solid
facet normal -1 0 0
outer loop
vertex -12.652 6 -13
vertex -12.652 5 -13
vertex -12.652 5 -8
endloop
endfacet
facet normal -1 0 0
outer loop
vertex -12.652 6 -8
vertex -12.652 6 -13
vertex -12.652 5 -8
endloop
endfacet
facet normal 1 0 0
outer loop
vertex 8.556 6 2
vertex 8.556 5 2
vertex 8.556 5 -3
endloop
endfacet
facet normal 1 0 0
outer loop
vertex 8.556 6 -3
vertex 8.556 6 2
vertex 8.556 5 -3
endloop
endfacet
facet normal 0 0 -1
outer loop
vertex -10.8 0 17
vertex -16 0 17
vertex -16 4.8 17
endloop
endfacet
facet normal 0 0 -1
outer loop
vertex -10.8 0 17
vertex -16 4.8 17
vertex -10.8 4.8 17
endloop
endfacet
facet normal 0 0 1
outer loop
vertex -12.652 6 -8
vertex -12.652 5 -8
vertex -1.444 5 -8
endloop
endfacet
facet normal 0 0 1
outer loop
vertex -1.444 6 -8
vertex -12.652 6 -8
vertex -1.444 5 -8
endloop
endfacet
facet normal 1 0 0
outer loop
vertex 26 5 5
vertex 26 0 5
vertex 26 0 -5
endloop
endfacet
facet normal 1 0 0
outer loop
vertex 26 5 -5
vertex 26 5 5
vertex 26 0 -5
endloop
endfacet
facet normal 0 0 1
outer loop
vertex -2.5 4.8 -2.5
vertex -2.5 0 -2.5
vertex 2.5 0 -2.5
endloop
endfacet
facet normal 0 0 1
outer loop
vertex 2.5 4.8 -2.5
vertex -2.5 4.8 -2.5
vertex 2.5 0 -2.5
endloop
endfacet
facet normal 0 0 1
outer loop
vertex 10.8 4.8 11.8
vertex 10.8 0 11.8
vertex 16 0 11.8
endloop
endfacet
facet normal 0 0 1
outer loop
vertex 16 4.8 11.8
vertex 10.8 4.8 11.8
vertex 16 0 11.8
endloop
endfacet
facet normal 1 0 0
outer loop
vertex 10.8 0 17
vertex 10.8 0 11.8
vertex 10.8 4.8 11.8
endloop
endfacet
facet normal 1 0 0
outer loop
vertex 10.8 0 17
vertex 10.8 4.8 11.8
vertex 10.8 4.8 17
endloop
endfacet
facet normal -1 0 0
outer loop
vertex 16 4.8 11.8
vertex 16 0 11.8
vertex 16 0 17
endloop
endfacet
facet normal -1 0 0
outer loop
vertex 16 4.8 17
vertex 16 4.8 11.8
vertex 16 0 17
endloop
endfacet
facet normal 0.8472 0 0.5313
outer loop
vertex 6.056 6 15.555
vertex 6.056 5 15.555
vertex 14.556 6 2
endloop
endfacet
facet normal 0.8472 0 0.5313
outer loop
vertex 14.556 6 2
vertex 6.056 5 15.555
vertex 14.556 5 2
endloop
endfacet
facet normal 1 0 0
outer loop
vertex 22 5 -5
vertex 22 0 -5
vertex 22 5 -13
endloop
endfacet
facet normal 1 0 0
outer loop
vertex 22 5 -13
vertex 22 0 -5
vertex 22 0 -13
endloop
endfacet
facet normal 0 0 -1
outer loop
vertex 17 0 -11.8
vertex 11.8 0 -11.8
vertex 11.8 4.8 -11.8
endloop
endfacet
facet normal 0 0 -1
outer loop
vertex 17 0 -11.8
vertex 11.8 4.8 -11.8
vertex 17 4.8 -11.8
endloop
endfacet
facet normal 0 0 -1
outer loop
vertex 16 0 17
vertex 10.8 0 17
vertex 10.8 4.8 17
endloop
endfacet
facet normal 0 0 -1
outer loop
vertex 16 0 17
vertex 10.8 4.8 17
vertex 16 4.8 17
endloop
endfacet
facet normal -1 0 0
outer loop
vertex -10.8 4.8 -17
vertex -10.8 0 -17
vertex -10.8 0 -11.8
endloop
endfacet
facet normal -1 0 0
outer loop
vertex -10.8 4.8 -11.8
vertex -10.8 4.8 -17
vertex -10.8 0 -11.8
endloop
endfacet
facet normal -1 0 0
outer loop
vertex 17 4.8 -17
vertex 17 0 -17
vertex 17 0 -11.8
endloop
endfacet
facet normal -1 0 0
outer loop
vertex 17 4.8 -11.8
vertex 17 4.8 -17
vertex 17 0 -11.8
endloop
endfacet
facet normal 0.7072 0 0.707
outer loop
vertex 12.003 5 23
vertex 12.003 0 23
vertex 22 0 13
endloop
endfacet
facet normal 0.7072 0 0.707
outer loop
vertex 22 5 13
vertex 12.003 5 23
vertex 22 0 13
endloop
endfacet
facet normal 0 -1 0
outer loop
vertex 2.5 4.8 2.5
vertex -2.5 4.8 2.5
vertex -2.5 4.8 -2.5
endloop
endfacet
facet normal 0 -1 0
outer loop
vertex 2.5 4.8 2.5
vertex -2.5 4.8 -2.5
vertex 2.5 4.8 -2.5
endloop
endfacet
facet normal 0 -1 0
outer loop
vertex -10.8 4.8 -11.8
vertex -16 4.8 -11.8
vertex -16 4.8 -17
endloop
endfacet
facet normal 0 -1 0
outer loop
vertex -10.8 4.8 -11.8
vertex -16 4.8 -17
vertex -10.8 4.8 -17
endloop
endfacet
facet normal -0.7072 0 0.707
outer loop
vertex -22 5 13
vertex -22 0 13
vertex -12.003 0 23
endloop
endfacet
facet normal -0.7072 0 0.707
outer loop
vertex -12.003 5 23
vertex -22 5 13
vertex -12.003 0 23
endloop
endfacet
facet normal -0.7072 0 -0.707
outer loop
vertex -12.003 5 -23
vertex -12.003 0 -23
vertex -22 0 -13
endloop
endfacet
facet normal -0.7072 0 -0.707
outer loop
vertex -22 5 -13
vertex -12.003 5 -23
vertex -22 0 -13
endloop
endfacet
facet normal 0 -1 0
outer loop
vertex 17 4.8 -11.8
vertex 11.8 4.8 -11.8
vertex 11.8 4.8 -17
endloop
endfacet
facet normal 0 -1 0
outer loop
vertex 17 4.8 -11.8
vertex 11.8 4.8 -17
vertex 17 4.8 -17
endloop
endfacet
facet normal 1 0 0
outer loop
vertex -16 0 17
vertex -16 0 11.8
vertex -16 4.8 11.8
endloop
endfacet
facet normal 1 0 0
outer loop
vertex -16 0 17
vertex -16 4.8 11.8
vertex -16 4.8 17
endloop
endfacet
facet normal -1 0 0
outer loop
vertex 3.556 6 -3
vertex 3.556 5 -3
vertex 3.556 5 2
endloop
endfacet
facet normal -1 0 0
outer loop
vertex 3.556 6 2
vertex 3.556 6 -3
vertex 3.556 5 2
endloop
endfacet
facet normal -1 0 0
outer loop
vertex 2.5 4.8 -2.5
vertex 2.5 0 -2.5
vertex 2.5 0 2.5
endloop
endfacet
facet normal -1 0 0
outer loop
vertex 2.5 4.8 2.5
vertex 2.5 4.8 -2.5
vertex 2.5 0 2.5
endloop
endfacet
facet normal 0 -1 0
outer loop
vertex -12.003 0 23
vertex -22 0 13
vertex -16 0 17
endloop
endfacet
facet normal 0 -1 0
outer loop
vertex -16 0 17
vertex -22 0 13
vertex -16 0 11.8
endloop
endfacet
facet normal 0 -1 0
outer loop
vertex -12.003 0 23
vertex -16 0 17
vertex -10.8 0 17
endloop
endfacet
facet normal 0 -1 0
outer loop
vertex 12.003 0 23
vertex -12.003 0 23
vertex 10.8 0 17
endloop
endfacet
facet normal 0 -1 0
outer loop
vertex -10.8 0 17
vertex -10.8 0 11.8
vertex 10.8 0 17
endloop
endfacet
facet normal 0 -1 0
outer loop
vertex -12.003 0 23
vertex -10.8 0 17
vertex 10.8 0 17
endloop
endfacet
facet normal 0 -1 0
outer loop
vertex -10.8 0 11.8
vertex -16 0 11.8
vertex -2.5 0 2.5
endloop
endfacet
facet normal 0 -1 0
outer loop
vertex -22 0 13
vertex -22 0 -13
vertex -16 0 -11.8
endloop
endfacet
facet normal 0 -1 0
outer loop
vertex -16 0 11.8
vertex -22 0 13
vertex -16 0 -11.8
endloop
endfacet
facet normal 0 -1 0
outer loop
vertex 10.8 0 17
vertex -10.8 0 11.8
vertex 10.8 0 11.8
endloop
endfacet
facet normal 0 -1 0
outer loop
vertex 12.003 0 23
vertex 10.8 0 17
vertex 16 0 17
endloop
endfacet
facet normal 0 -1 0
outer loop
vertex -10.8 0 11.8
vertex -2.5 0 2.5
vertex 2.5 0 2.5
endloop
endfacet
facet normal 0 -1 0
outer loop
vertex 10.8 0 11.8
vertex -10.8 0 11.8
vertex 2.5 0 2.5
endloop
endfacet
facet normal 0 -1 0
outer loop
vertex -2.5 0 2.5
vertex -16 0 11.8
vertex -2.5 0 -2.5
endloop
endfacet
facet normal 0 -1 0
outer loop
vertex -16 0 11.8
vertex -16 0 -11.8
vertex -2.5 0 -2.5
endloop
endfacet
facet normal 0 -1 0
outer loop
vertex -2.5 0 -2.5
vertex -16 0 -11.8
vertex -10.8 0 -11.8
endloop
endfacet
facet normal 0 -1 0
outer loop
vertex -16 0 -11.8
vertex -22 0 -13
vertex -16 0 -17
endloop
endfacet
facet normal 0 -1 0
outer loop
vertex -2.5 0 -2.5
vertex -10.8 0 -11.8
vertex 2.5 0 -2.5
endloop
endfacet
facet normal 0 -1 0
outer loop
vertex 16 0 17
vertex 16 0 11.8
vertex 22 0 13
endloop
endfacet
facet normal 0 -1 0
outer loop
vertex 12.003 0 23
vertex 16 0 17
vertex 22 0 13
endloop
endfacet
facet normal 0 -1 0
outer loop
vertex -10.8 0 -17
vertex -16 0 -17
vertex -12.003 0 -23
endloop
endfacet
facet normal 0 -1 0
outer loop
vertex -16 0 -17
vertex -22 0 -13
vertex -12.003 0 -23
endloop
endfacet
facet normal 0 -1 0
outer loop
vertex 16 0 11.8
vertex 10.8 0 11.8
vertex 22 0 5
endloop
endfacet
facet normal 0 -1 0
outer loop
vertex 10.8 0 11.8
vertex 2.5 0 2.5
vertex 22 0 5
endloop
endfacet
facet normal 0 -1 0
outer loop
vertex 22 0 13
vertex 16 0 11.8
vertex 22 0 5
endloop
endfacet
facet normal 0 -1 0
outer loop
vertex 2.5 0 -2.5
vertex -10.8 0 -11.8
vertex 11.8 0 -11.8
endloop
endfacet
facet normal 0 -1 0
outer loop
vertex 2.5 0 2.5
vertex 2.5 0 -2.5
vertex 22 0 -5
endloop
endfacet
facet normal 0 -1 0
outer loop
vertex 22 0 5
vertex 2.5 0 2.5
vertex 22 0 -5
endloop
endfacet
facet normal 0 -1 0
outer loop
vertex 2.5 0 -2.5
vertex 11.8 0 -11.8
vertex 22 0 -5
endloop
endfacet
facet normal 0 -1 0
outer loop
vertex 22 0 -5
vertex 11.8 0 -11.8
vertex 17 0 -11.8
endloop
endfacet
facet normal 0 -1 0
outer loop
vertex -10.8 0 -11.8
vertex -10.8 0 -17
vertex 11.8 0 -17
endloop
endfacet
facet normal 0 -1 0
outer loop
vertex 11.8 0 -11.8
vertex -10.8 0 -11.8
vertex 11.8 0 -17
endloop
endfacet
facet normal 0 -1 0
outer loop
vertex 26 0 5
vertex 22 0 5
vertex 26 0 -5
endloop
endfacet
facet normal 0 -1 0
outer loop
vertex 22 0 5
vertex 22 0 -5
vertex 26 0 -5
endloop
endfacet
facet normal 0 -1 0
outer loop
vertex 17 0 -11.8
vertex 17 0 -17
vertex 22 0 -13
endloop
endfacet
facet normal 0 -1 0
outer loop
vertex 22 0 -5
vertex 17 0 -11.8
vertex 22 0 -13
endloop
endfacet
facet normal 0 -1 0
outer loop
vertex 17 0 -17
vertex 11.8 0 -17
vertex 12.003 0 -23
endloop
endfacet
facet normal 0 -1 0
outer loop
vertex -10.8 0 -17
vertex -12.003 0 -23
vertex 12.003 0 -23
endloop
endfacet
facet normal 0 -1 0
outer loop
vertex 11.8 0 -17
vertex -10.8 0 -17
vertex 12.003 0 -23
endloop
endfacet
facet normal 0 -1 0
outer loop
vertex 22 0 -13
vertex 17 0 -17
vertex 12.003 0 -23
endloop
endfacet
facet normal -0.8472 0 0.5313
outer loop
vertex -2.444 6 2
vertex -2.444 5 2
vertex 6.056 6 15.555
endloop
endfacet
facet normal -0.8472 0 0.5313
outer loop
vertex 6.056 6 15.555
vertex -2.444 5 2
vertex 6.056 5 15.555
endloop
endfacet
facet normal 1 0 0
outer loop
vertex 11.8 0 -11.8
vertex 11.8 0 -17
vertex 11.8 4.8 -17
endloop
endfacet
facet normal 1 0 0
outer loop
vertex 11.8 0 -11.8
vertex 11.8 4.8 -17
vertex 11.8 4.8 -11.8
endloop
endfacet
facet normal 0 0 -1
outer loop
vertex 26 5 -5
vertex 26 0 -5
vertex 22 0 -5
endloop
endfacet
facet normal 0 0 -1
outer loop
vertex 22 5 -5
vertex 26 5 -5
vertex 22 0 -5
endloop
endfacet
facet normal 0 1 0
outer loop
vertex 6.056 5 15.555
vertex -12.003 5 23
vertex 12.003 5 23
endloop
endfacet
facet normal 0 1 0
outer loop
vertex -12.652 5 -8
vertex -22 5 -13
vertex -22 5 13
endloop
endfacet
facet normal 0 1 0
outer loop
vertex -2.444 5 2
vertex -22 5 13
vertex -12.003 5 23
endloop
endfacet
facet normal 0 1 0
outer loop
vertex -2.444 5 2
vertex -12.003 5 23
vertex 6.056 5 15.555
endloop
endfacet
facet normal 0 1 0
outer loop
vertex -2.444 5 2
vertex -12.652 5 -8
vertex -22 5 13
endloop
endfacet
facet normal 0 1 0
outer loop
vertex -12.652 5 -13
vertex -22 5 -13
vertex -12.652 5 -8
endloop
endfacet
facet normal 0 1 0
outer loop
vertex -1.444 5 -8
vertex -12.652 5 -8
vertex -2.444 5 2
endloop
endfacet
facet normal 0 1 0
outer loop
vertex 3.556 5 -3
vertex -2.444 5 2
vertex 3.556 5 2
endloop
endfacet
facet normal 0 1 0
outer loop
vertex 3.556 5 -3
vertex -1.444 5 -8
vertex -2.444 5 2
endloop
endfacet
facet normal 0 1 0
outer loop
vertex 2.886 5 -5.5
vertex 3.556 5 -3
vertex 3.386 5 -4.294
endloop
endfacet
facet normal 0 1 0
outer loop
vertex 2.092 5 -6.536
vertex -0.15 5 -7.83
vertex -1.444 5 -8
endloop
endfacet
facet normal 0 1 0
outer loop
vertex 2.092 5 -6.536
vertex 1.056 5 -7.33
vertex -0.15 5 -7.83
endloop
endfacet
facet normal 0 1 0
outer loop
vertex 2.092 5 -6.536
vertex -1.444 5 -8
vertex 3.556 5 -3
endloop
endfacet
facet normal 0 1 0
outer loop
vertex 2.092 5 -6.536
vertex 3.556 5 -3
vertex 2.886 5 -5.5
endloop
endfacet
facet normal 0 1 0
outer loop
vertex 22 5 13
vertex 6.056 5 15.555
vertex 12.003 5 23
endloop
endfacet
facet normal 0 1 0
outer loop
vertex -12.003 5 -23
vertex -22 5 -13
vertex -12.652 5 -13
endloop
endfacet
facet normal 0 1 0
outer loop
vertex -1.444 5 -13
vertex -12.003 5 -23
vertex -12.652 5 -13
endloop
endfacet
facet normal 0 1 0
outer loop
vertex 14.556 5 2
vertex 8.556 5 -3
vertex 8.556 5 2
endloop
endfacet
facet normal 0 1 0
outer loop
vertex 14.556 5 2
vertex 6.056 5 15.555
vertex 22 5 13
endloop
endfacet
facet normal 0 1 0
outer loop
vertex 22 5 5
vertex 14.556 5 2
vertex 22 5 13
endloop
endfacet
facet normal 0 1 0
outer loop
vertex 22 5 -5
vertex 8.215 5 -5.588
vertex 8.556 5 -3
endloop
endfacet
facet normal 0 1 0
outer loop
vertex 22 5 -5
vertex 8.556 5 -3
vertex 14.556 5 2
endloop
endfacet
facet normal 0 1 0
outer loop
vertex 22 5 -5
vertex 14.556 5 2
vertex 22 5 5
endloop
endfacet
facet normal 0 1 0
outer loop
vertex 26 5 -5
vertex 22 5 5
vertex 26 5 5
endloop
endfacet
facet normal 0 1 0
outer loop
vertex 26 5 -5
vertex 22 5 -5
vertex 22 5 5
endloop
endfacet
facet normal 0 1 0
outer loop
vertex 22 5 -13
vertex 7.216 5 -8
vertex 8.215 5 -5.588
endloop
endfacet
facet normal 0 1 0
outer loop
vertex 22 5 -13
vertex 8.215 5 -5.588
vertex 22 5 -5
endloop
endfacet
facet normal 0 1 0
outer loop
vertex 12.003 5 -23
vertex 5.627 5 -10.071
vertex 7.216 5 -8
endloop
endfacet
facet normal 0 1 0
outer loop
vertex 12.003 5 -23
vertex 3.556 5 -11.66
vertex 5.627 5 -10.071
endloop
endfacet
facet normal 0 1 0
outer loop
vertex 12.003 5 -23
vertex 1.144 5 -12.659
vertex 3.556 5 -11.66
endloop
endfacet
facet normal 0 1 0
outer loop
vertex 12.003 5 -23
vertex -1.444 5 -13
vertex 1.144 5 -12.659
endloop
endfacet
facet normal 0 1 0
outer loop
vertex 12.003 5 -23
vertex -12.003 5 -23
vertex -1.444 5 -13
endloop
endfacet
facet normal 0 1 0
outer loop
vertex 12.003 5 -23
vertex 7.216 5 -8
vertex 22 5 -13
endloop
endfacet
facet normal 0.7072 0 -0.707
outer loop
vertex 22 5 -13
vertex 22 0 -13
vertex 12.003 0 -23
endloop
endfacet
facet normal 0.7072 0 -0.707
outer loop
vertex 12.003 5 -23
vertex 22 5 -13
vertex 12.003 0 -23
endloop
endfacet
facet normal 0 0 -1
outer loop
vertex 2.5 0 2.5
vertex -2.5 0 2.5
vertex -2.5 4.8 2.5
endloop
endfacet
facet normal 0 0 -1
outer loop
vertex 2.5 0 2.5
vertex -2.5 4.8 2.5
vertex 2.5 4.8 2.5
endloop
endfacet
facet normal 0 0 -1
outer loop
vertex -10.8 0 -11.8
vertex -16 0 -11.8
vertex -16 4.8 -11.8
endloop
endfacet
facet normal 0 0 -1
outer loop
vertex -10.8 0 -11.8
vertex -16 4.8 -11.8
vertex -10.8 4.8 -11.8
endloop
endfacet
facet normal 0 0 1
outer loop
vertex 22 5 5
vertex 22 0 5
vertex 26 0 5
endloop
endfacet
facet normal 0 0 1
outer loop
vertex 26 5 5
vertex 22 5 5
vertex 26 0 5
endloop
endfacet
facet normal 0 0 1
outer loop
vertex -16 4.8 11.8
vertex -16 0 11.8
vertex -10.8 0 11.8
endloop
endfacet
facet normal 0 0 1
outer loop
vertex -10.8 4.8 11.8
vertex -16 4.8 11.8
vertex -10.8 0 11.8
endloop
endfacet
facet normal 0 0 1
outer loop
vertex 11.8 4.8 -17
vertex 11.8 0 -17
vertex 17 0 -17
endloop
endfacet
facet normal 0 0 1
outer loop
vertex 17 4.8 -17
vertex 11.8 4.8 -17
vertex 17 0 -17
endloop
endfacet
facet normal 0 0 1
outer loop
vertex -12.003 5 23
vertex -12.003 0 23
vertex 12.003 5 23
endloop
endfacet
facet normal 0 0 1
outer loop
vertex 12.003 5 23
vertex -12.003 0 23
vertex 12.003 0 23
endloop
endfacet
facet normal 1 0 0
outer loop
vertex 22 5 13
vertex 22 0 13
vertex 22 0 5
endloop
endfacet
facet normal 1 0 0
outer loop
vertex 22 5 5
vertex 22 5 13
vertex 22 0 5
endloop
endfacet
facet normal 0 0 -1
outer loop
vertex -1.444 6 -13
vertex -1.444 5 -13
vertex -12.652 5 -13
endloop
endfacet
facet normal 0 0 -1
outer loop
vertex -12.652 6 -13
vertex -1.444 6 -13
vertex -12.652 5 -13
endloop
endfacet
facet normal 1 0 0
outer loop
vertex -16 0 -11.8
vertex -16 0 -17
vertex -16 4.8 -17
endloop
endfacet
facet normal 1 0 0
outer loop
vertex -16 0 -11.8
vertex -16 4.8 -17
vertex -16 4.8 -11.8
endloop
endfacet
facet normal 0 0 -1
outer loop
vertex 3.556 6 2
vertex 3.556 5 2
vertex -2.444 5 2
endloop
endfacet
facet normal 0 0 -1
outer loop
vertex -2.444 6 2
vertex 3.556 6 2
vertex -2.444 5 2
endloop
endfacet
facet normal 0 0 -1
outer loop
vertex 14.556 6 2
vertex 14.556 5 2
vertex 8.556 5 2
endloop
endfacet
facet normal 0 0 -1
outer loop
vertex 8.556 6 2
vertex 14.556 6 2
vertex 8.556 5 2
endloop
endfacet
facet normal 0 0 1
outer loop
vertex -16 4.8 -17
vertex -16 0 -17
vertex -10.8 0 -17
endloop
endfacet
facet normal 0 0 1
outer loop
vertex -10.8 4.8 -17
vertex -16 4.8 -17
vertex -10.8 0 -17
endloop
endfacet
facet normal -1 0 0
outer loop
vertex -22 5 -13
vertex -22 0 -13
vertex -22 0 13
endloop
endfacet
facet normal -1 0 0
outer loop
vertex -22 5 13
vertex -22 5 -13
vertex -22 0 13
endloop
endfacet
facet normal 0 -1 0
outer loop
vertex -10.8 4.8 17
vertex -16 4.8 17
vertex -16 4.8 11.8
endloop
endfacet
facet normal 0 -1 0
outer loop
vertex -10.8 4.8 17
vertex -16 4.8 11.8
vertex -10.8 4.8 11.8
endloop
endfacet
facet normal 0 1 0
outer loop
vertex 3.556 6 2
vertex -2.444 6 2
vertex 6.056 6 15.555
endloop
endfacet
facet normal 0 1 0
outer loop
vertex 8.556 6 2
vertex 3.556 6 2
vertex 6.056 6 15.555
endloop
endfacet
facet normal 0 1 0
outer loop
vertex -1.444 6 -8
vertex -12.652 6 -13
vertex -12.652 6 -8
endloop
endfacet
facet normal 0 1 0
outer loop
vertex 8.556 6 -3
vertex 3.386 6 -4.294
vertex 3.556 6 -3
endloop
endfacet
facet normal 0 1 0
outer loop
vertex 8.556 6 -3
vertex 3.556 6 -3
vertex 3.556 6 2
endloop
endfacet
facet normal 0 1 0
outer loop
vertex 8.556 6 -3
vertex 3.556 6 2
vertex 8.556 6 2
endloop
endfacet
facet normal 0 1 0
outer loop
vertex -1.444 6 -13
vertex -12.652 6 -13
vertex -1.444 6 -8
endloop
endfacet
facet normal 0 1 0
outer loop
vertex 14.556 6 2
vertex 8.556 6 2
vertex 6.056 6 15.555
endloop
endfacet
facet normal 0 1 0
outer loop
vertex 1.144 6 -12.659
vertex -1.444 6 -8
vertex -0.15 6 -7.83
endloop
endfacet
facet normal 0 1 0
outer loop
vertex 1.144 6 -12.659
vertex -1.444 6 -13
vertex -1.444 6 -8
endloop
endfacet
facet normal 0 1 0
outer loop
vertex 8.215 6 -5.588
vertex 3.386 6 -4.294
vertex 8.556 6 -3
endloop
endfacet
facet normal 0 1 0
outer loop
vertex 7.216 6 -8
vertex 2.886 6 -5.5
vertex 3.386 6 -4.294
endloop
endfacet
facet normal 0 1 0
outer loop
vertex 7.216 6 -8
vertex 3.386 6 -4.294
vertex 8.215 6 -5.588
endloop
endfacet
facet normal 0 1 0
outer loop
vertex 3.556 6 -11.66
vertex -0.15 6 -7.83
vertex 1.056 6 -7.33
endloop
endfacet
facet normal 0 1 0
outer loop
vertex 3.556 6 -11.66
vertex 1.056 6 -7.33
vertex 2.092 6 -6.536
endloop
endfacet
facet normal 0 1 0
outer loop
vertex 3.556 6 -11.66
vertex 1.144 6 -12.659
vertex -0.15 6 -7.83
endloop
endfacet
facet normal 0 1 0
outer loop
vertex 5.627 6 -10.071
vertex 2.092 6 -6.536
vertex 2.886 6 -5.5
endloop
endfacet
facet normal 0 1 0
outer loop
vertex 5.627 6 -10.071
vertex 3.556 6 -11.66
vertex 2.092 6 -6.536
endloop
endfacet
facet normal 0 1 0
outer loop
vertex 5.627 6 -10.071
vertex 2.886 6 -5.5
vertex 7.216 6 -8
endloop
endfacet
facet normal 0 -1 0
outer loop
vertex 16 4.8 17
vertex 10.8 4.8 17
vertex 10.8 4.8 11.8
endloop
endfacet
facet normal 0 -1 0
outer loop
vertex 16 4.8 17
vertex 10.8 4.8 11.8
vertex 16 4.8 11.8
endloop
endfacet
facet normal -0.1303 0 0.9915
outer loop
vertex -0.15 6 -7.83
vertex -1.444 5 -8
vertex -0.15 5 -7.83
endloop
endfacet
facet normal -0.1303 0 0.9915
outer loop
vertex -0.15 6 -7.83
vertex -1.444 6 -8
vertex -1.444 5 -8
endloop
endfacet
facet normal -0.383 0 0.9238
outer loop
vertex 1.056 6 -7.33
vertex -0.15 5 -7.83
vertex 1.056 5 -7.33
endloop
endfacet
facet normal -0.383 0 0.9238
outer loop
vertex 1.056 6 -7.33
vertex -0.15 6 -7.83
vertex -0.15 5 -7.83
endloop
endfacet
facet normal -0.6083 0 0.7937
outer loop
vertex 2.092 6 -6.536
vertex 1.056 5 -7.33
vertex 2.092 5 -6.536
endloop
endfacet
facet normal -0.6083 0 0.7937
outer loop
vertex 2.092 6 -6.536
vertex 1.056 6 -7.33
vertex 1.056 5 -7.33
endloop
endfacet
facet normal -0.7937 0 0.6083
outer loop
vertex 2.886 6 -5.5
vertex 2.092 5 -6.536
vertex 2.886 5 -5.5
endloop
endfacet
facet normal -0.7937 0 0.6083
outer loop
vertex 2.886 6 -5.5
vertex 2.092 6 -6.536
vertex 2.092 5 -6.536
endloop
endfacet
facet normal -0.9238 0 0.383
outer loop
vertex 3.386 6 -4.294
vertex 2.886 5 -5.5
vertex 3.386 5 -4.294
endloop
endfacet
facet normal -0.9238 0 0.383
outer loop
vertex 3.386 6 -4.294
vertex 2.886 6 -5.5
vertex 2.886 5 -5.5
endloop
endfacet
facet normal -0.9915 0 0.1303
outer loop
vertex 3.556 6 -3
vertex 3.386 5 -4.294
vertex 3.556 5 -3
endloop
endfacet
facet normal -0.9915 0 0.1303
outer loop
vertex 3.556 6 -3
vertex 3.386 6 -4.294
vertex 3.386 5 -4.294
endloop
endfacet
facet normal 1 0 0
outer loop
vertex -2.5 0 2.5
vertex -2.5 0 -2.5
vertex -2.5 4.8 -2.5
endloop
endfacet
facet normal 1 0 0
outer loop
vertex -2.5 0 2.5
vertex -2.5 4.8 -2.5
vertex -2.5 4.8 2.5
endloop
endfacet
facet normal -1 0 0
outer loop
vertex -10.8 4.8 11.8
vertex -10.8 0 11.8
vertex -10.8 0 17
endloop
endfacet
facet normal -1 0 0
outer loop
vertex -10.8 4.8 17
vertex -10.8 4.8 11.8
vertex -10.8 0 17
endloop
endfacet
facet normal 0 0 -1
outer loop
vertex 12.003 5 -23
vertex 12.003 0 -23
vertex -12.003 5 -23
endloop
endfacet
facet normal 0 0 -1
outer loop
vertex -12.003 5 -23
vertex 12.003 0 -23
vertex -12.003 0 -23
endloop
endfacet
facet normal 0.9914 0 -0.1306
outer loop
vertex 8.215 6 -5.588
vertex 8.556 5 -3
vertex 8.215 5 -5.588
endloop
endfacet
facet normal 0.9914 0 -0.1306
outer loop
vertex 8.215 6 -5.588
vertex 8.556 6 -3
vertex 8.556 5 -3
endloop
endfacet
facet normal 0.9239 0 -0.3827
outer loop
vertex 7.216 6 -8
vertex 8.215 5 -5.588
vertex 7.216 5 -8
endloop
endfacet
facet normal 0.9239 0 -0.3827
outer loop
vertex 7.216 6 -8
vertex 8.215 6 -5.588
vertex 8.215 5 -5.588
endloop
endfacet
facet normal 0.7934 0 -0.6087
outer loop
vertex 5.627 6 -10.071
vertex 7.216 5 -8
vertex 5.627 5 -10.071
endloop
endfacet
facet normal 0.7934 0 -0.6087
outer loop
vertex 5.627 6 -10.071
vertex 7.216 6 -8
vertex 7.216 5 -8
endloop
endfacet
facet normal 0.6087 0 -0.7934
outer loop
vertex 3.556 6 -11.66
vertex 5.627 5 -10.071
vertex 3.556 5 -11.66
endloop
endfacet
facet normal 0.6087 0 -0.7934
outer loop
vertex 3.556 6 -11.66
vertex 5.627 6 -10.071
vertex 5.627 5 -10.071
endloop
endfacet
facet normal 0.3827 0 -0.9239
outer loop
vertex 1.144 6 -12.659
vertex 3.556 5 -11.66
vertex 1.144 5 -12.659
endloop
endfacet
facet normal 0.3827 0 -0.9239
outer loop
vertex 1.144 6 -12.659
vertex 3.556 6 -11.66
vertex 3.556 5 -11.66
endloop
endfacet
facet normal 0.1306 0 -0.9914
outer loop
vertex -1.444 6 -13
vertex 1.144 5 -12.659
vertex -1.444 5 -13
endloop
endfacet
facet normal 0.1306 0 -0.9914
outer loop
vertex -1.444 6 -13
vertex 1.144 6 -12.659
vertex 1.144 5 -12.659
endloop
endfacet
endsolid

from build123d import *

# Parameters (mm, degrees)
BOSS_EXTRU_1_DEPTH      = 5
BOSS_EXTRU_2_DEPTH      = 1
ESQUISSE3_W             = 5.2
ESQUISSE3_H             = 5.2
ESQUISSE3_W_2           = 5
ESQUISSE3_H_2           = 5
ENL_V_MAT_EXTRU_1_DEPTH = 4.8
CONG_1_R                = 10
CONG_2_R                = 5


with BuildPart() as part:
    # Esquisse1 → Boss.-Extru.1 (new body)
    with BuildSketch(Plane(origin=(0, 0, 0), x_dir=(1, 0, 0), z_dir=(0, 1, 0))):
        Polygon((22, 13), (12.003020456, 23), (-12.003020456, 23), (-22, 13), (-22, -13), (-12.003020456, -23), (12.003020456, -23), (22, -13), (22, -5), (26, -5), (26, 5), (22, 5), align=None)
    extrude(amount=BOSS_EXTRU_1_DEPTH)

    # Esquisse2 → Boss.-Extru.2 (add)
    with BuildSketch(Plane(origin=(0, 5, 0), x_dir=(1, 0, 0), z_dir=(0, 1, 0))):
        Polygon((-12.651968736, 13), (-12.651968736, 8), (3.556100985, 8), (3.556100985, -2), (-2.443899015, -2), (6.056100985, -15.555441712), (14.556100985, -2), (8.556100985, -2), (8.556100985, 13), align=None)
    extrude(amount=BOSS_EXTRU_2_DEPTH)

    # Esquisse3 → Enlèv. mat.-Extru.1 (cut)
    with BuildSketch(Plane.XZ):
        with Locations((-13.4, 14.4)):
            Rectangle(ESQUISSE3_W, ESQUISSE3_H)
        with Locations((-13.4, -14.4)):
            Rectangle(ESQUISSE3_W, ESQUISSE3_H)
        with Locations((14.4, -14.4)):
            Rectangle(ESQUISSE3_W, ESQUISSE3_H)
        with Locations((13.4, 14.4)):
            Rectangle(ESQUISSE3_W, ESQUISSE3_H)
        Rectangle(ESQUISSE3_W_2, ESQUISSE3_H_2)
    extrude(amount=-ENL_V_MAT_EXTRU_1_DEPTH, mode=Mode.SUBTRACT)

    # Congé1
    cong_1_edges = [part.edges().sort_by_distance(p)[0] for p in [
        (8.556100985, 5.5, -13),
    ]]
    fillet(cong_1_edges, radius=CONG_1_R)

    # Congé2
    cong_2_edges = [part.edges().sort_by_distance(p)[0] for p in [
        (3.556100985, 5.5, -8),
    ]]
    fillet(cong_2_edges, radius=CONG_2_R)


solid = part.part
